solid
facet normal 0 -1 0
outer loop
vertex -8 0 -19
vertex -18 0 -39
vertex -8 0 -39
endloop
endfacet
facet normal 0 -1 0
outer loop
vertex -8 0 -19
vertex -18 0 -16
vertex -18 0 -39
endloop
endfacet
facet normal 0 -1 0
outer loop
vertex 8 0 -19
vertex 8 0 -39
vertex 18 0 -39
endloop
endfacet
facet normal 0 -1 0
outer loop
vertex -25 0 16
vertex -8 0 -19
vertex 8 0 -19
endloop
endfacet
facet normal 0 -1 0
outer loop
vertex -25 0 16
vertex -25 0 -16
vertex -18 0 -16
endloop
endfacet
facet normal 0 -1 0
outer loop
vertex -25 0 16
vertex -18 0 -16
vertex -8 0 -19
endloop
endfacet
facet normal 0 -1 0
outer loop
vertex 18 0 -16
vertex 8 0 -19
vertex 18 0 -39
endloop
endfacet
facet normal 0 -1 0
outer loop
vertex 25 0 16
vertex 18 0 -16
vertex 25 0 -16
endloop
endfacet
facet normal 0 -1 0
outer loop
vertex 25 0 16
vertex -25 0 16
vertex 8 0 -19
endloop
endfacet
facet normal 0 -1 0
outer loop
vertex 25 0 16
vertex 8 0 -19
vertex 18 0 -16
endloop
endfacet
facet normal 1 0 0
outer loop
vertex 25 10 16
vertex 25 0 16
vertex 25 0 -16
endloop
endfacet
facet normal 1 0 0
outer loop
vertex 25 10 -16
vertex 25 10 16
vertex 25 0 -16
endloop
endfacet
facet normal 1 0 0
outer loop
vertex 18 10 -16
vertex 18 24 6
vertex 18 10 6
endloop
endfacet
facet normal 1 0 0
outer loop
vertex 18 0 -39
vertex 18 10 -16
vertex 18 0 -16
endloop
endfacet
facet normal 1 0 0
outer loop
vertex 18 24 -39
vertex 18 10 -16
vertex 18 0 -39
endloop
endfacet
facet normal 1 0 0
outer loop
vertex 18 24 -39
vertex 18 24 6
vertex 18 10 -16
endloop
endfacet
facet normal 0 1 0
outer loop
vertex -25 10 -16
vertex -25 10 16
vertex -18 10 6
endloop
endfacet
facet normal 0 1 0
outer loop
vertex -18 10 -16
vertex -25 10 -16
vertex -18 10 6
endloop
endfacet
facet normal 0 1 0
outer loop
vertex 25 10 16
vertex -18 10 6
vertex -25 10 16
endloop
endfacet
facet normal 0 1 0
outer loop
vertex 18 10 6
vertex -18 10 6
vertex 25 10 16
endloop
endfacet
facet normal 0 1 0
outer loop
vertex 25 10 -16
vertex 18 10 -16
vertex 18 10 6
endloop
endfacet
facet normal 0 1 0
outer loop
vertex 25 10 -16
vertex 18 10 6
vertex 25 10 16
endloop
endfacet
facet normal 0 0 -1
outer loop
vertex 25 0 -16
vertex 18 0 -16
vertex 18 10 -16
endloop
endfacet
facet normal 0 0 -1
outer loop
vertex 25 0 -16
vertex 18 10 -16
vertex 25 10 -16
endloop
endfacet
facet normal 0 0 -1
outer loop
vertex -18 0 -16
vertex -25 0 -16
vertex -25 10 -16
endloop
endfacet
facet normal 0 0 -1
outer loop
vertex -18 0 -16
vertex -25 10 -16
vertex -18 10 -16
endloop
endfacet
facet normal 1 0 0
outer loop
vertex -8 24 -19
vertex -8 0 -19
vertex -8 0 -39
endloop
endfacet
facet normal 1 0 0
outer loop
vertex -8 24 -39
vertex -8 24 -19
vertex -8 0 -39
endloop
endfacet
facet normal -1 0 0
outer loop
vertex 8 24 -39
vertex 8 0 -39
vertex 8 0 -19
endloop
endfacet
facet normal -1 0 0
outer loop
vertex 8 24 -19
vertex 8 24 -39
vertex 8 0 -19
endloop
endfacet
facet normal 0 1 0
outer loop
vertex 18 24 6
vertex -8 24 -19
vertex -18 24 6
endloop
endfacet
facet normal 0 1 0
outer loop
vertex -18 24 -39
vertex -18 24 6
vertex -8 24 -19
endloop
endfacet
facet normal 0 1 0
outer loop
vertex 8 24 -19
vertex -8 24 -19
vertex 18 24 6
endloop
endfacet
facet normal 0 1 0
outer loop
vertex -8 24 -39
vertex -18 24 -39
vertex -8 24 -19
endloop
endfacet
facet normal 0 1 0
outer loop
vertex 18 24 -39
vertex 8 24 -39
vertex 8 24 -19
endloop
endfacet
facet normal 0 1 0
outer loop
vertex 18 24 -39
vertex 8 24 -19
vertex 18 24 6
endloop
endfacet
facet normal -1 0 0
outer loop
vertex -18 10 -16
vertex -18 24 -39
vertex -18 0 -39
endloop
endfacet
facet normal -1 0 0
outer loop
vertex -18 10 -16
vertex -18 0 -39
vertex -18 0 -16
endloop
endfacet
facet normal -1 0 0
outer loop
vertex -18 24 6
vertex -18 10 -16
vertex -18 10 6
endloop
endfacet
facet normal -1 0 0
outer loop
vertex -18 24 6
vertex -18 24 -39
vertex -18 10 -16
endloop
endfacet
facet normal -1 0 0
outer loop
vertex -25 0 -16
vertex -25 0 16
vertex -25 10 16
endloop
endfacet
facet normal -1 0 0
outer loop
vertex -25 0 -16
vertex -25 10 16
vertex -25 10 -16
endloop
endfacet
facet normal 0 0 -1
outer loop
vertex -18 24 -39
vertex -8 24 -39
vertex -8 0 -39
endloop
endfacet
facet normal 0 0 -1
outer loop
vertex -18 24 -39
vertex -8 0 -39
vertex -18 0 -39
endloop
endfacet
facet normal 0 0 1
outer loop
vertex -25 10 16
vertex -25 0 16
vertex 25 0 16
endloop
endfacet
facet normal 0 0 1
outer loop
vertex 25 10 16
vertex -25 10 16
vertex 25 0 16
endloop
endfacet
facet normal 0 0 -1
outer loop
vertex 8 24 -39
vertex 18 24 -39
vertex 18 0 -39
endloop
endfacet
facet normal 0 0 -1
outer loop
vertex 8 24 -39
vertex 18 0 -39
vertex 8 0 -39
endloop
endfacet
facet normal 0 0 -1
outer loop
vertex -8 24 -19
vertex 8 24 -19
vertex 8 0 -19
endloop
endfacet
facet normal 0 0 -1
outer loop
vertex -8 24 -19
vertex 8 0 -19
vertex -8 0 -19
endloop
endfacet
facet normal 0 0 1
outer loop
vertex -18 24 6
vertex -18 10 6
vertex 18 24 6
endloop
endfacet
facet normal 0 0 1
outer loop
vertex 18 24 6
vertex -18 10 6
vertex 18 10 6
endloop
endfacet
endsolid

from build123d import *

# Parameters (mm, degrees)
CROQUIS1_W                          = 50
CROQUIS1_H                          = 32
SALIENTE_EXTRUIR1_DEPTH             = 10
SALIENTE_EXTRUIR4_DEPTH             = 14
SALIENTE_EXTRUIR4_DIRECTION_2_REACH = 33.321


with BuildPart() as part:
    # Croquis1 → Saliente-Extruir1 (new body)
    with BuildSketch(Plane(origin=(0, 0, 0), x_dir=(1, 0, 0), z_dir=(0, 1, 0))):
        Rectangle(CROQUIS1_W, CROQUIS1_H)
    extrude(amount=SALIENTE_EXTRUIR1_DEPTH)

    # Croquis2 → Saliente-Extruir4 (add)
    with BuildSketch(Plane(origin=(0, 10, 0), x_dir=(1, 0, 0), z_dir=(0, 1, 0))):
        Polygon((-8, 39), (-18, 39), (-18, -6), (18, -6), (18, 39), (8, 39), (8, 19), (-8, 19), align=None)
    extrude(amount=SALIENTE_EXTRUIR4_DEPTH)

    # Saliente-Extruir4 direction 2: up to this face of the body (flat: up to its plane)
    saliente_extruir4_direction_2_end = Plane(part.part.faces().sort_by_distance((0, 0, 0))[0])
    # Croquis2 → Saliente-Extruir4 direction 2 (add, up to the picked face)
    with BuildSketch(Plane(origin=(0, 10, 0), x_dir=(1, 0, 0), z_dir=(0, 1, 0)), mode=Mode.PRIVATE) as saliente_extruir4_direction_2_sk1:
        Polygon((-8, 39), (-18, 39), (-18, -6), (18, -6), (18, 39), (8, 39), (8, 19), (-8, 19), align=None)
    saliente_extruir4_direction_2_tool1 = split(extrude(saliente_extruir4_direction_2_sk1.sketch, amount=-SALIENTE_EXTRUIR4_DIRECTION_2_REACH, mode=Mode.PRIVATE), bisect_by=saliente_extruir4_direction_2_end, keep=Keep.BOTH, mode=Mode.PRIVATE)
    add(saliente_extruir4_direction_2_tool1.solids().sort_by(Axis((0, 10, -13.423077), (0, -1, 0)))[0])


solid = part.part
